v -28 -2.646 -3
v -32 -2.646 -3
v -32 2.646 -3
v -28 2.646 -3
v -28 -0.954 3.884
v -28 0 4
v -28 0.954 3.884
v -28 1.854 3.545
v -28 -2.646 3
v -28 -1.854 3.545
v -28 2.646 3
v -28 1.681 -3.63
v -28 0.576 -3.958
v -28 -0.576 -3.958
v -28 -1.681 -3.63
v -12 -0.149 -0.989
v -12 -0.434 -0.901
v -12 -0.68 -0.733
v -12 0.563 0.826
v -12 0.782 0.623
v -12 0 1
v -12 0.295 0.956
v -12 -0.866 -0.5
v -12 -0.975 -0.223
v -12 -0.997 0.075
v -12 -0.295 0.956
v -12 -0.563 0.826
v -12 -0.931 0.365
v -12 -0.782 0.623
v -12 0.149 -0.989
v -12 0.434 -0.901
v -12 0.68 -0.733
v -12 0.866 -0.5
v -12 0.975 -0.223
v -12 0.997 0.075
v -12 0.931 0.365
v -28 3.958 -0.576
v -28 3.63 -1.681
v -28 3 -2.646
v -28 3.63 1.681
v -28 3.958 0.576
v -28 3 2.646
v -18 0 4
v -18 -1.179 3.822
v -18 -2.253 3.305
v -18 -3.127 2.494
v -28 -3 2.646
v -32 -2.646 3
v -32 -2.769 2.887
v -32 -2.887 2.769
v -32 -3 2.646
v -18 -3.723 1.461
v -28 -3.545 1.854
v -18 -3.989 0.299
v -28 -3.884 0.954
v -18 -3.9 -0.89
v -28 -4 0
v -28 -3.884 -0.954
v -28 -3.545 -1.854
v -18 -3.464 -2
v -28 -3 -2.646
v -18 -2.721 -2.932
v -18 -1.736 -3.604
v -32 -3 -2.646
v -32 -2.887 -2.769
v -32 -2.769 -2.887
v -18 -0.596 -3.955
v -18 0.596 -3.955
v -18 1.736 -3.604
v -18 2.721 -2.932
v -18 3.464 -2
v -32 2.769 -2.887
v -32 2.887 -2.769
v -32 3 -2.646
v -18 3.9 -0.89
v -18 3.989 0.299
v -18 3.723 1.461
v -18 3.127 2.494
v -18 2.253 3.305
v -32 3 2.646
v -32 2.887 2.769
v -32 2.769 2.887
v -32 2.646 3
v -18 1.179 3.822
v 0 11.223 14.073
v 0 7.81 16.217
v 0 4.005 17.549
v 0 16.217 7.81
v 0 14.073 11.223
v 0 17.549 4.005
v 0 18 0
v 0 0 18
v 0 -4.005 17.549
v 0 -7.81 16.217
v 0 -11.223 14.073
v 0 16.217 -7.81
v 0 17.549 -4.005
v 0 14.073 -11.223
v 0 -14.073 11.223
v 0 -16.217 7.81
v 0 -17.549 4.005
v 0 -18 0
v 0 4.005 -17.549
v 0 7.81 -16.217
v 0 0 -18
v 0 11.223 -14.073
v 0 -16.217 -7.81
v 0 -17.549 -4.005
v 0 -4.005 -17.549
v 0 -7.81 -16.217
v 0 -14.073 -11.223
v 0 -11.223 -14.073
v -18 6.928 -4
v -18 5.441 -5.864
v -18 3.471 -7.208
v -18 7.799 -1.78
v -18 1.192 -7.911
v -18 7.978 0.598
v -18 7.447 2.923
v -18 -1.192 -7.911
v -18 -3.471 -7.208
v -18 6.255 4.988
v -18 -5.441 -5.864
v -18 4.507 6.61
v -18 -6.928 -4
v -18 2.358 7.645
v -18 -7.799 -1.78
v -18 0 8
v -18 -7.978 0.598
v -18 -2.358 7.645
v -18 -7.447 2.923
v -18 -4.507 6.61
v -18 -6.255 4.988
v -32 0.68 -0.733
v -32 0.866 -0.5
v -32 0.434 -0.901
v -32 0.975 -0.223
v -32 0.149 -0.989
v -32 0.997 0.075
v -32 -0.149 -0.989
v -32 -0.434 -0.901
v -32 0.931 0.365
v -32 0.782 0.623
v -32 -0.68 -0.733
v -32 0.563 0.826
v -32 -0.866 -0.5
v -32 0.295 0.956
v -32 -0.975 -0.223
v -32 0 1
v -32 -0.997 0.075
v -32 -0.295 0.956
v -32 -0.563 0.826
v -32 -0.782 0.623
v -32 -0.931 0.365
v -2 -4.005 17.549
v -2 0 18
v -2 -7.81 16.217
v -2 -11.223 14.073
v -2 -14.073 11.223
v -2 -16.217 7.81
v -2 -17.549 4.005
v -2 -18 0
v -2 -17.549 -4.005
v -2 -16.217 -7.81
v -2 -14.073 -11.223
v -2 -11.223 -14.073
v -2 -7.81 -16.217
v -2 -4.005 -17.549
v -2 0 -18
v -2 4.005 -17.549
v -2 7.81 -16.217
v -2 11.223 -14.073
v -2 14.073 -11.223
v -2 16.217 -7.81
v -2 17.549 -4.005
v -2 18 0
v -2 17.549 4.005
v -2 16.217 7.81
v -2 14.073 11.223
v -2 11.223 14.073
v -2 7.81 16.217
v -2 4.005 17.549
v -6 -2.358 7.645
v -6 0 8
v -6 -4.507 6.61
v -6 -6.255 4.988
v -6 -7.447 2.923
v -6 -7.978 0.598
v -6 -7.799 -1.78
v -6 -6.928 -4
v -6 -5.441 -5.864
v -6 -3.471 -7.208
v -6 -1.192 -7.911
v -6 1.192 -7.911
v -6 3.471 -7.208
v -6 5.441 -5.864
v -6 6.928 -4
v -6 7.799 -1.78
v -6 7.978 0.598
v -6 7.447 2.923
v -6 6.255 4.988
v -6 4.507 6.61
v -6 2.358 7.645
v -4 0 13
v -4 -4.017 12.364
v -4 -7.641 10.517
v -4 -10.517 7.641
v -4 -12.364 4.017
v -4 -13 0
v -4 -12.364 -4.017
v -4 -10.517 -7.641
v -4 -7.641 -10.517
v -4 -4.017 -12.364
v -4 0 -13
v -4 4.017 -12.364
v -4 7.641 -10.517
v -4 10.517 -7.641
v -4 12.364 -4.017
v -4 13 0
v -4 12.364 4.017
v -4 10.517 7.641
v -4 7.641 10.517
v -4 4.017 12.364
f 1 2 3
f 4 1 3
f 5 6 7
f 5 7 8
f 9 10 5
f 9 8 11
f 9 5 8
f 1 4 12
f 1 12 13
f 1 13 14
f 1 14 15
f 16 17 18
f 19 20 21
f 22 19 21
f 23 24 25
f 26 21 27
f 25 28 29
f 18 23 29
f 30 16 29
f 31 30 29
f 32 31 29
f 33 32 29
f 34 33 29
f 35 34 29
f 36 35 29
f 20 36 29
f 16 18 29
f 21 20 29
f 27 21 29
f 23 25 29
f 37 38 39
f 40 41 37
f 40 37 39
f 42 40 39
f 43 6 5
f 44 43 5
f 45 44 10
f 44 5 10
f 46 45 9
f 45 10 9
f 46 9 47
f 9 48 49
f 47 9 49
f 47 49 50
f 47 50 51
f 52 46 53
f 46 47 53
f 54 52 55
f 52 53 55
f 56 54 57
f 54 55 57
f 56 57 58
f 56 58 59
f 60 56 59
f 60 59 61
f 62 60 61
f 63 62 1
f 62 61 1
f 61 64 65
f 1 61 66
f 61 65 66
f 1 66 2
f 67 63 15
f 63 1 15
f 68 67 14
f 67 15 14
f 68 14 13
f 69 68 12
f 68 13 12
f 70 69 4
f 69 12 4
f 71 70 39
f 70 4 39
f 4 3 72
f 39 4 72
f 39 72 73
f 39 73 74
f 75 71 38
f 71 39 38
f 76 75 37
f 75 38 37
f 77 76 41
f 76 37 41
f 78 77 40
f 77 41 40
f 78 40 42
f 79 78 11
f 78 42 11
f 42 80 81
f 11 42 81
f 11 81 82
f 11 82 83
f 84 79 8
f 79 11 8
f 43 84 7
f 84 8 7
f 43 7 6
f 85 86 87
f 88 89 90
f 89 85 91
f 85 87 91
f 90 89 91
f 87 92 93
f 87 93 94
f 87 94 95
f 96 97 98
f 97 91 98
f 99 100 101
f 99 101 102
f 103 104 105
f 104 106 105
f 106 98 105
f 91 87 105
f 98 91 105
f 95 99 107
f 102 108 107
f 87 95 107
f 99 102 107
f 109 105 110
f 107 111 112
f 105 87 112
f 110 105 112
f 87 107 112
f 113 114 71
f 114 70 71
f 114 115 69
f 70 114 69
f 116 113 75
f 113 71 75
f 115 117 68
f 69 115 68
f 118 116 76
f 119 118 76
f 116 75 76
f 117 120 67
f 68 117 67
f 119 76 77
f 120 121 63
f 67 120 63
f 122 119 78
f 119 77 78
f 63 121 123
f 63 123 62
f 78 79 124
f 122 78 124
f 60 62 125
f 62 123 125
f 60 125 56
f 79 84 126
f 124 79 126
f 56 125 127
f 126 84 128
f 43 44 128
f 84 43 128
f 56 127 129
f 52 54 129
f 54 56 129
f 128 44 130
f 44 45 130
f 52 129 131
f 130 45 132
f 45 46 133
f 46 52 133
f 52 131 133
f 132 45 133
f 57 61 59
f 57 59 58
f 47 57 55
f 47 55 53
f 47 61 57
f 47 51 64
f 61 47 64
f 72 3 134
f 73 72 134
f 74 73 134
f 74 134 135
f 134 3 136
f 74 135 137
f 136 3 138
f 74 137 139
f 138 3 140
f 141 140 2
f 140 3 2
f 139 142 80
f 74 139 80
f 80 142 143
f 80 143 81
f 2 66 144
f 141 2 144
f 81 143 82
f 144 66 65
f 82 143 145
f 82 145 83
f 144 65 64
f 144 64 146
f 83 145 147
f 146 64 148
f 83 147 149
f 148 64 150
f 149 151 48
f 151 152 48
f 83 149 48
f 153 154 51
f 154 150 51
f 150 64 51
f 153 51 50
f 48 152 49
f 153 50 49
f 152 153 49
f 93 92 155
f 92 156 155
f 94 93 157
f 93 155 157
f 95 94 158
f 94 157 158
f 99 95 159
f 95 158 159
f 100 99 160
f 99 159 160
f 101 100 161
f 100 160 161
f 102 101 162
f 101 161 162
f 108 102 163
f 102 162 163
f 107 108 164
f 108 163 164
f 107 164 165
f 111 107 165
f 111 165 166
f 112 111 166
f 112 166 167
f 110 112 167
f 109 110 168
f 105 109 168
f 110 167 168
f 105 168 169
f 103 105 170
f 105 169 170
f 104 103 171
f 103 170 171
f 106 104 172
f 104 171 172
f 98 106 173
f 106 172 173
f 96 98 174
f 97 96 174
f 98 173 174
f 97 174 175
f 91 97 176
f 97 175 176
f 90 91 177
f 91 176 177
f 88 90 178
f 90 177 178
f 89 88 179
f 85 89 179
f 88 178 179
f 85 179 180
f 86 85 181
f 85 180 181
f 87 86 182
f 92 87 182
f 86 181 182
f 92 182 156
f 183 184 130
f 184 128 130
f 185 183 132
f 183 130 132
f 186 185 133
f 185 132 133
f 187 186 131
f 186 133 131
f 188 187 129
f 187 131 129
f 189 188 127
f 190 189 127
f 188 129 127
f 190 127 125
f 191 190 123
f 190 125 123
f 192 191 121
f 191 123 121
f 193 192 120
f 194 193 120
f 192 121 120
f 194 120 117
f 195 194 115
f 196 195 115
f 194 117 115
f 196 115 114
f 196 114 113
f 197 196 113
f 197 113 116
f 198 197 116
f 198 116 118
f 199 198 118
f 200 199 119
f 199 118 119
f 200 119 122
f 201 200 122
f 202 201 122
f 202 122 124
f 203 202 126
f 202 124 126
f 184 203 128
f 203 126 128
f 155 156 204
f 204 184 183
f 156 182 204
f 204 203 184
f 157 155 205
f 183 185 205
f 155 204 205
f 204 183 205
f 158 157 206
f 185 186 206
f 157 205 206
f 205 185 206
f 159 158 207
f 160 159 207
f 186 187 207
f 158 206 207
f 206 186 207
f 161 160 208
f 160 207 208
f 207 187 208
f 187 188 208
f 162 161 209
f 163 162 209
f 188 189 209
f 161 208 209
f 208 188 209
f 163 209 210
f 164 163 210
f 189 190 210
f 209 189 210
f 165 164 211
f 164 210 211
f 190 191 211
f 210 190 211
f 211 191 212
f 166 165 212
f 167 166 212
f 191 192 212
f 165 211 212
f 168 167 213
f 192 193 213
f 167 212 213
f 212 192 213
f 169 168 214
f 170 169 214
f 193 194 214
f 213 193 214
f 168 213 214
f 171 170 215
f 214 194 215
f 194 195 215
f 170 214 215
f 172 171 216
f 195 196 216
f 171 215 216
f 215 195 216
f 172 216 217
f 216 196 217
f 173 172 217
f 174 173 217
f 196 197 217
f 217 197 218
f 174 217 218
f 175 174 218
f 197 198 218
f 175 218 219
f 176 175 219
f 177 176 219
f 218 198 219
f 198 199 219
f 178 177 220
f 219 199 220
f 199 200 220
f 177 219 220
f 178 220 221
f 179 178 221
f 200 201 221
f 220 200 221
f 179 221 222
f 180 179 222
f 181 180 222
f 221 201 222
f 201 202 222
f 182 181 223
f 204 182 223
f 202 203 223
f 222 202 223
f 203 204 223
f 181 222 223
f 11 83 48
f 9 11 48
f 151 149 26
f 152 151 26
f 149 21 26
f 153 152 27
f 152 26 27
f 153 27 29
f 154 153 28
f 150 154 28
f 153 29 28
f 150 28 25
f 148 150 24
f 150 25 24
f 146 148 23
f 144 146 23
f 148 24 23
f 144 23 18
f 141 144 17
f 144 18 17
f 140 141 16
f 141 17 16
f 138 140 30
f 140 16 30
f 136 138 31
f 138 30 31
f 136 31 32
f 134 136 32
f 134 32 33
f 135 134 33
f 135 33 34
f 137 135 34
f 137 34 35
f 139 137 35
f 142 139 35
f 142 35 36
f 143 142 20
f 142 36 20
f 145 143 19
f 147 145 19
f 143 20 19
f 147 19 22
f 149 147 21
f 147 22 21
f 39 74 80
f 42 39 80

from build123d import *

# Parameters (mm, degrees)
F2_R     = 1
F3_DEPTH = 4


with BuildPart() as f1:
    # F0 (on Front) → F1 (revolve)
    with BuildSketch(Plane.XZ):
        Polygon((-6, 8), (-18, 8), (-18, 4), (-32, 4), (-32, 1), (-12, 1), (-12, 0), (0, 0), (0, 18), (-2, 18), align=None)
    revolve(axis=Axis((0, 0, 0), (1, 0, 0)))

    # F2 (on face) → F3 (cut)
    with BuildSketch(Plane(origin=(-32, 0, 0), x_dir=(0, -1, 0), z_dir=(-1, 0, 0))):
        Circle(F2_R)
        with BuildLine():
            ThreePointArc((2.6457513111, 3), (0, 4), (-2.6457513111, 3))
            Line((-2.6457513111, 3), (2.6457513111, 3))
        make_face()
        with BuildLine():
            ThreePointArc((4, 0), (3.7416573868, 1.4142135624), (3, 2.6457513111))
            Line((3, 2.6457513111), (3, -2.6457513111))
            ThreePointArc((3, -2.6457513111), (3.7416573868, -1.4142135624), (4, 0))
        make_face()
        with BuildLine():
            Line((2.6457513111, -3), (-2.6457513111, -3))
            ThreePointArc((-2.6457513111, -3), (0, -4), (2.6457513111, -3))
        make_face()
        with BuildLine():
            Line((-3, -2.6457513111), (-3, 2.6457513111))
            ThreePointArc((-3, 2.6457513111), (-4, 0), (-3, -2.6457513111))
        make_face()
    extrude(amount=-F3_DEPTH, mode=Mode.SUBTRACT)


solid = f1.part
